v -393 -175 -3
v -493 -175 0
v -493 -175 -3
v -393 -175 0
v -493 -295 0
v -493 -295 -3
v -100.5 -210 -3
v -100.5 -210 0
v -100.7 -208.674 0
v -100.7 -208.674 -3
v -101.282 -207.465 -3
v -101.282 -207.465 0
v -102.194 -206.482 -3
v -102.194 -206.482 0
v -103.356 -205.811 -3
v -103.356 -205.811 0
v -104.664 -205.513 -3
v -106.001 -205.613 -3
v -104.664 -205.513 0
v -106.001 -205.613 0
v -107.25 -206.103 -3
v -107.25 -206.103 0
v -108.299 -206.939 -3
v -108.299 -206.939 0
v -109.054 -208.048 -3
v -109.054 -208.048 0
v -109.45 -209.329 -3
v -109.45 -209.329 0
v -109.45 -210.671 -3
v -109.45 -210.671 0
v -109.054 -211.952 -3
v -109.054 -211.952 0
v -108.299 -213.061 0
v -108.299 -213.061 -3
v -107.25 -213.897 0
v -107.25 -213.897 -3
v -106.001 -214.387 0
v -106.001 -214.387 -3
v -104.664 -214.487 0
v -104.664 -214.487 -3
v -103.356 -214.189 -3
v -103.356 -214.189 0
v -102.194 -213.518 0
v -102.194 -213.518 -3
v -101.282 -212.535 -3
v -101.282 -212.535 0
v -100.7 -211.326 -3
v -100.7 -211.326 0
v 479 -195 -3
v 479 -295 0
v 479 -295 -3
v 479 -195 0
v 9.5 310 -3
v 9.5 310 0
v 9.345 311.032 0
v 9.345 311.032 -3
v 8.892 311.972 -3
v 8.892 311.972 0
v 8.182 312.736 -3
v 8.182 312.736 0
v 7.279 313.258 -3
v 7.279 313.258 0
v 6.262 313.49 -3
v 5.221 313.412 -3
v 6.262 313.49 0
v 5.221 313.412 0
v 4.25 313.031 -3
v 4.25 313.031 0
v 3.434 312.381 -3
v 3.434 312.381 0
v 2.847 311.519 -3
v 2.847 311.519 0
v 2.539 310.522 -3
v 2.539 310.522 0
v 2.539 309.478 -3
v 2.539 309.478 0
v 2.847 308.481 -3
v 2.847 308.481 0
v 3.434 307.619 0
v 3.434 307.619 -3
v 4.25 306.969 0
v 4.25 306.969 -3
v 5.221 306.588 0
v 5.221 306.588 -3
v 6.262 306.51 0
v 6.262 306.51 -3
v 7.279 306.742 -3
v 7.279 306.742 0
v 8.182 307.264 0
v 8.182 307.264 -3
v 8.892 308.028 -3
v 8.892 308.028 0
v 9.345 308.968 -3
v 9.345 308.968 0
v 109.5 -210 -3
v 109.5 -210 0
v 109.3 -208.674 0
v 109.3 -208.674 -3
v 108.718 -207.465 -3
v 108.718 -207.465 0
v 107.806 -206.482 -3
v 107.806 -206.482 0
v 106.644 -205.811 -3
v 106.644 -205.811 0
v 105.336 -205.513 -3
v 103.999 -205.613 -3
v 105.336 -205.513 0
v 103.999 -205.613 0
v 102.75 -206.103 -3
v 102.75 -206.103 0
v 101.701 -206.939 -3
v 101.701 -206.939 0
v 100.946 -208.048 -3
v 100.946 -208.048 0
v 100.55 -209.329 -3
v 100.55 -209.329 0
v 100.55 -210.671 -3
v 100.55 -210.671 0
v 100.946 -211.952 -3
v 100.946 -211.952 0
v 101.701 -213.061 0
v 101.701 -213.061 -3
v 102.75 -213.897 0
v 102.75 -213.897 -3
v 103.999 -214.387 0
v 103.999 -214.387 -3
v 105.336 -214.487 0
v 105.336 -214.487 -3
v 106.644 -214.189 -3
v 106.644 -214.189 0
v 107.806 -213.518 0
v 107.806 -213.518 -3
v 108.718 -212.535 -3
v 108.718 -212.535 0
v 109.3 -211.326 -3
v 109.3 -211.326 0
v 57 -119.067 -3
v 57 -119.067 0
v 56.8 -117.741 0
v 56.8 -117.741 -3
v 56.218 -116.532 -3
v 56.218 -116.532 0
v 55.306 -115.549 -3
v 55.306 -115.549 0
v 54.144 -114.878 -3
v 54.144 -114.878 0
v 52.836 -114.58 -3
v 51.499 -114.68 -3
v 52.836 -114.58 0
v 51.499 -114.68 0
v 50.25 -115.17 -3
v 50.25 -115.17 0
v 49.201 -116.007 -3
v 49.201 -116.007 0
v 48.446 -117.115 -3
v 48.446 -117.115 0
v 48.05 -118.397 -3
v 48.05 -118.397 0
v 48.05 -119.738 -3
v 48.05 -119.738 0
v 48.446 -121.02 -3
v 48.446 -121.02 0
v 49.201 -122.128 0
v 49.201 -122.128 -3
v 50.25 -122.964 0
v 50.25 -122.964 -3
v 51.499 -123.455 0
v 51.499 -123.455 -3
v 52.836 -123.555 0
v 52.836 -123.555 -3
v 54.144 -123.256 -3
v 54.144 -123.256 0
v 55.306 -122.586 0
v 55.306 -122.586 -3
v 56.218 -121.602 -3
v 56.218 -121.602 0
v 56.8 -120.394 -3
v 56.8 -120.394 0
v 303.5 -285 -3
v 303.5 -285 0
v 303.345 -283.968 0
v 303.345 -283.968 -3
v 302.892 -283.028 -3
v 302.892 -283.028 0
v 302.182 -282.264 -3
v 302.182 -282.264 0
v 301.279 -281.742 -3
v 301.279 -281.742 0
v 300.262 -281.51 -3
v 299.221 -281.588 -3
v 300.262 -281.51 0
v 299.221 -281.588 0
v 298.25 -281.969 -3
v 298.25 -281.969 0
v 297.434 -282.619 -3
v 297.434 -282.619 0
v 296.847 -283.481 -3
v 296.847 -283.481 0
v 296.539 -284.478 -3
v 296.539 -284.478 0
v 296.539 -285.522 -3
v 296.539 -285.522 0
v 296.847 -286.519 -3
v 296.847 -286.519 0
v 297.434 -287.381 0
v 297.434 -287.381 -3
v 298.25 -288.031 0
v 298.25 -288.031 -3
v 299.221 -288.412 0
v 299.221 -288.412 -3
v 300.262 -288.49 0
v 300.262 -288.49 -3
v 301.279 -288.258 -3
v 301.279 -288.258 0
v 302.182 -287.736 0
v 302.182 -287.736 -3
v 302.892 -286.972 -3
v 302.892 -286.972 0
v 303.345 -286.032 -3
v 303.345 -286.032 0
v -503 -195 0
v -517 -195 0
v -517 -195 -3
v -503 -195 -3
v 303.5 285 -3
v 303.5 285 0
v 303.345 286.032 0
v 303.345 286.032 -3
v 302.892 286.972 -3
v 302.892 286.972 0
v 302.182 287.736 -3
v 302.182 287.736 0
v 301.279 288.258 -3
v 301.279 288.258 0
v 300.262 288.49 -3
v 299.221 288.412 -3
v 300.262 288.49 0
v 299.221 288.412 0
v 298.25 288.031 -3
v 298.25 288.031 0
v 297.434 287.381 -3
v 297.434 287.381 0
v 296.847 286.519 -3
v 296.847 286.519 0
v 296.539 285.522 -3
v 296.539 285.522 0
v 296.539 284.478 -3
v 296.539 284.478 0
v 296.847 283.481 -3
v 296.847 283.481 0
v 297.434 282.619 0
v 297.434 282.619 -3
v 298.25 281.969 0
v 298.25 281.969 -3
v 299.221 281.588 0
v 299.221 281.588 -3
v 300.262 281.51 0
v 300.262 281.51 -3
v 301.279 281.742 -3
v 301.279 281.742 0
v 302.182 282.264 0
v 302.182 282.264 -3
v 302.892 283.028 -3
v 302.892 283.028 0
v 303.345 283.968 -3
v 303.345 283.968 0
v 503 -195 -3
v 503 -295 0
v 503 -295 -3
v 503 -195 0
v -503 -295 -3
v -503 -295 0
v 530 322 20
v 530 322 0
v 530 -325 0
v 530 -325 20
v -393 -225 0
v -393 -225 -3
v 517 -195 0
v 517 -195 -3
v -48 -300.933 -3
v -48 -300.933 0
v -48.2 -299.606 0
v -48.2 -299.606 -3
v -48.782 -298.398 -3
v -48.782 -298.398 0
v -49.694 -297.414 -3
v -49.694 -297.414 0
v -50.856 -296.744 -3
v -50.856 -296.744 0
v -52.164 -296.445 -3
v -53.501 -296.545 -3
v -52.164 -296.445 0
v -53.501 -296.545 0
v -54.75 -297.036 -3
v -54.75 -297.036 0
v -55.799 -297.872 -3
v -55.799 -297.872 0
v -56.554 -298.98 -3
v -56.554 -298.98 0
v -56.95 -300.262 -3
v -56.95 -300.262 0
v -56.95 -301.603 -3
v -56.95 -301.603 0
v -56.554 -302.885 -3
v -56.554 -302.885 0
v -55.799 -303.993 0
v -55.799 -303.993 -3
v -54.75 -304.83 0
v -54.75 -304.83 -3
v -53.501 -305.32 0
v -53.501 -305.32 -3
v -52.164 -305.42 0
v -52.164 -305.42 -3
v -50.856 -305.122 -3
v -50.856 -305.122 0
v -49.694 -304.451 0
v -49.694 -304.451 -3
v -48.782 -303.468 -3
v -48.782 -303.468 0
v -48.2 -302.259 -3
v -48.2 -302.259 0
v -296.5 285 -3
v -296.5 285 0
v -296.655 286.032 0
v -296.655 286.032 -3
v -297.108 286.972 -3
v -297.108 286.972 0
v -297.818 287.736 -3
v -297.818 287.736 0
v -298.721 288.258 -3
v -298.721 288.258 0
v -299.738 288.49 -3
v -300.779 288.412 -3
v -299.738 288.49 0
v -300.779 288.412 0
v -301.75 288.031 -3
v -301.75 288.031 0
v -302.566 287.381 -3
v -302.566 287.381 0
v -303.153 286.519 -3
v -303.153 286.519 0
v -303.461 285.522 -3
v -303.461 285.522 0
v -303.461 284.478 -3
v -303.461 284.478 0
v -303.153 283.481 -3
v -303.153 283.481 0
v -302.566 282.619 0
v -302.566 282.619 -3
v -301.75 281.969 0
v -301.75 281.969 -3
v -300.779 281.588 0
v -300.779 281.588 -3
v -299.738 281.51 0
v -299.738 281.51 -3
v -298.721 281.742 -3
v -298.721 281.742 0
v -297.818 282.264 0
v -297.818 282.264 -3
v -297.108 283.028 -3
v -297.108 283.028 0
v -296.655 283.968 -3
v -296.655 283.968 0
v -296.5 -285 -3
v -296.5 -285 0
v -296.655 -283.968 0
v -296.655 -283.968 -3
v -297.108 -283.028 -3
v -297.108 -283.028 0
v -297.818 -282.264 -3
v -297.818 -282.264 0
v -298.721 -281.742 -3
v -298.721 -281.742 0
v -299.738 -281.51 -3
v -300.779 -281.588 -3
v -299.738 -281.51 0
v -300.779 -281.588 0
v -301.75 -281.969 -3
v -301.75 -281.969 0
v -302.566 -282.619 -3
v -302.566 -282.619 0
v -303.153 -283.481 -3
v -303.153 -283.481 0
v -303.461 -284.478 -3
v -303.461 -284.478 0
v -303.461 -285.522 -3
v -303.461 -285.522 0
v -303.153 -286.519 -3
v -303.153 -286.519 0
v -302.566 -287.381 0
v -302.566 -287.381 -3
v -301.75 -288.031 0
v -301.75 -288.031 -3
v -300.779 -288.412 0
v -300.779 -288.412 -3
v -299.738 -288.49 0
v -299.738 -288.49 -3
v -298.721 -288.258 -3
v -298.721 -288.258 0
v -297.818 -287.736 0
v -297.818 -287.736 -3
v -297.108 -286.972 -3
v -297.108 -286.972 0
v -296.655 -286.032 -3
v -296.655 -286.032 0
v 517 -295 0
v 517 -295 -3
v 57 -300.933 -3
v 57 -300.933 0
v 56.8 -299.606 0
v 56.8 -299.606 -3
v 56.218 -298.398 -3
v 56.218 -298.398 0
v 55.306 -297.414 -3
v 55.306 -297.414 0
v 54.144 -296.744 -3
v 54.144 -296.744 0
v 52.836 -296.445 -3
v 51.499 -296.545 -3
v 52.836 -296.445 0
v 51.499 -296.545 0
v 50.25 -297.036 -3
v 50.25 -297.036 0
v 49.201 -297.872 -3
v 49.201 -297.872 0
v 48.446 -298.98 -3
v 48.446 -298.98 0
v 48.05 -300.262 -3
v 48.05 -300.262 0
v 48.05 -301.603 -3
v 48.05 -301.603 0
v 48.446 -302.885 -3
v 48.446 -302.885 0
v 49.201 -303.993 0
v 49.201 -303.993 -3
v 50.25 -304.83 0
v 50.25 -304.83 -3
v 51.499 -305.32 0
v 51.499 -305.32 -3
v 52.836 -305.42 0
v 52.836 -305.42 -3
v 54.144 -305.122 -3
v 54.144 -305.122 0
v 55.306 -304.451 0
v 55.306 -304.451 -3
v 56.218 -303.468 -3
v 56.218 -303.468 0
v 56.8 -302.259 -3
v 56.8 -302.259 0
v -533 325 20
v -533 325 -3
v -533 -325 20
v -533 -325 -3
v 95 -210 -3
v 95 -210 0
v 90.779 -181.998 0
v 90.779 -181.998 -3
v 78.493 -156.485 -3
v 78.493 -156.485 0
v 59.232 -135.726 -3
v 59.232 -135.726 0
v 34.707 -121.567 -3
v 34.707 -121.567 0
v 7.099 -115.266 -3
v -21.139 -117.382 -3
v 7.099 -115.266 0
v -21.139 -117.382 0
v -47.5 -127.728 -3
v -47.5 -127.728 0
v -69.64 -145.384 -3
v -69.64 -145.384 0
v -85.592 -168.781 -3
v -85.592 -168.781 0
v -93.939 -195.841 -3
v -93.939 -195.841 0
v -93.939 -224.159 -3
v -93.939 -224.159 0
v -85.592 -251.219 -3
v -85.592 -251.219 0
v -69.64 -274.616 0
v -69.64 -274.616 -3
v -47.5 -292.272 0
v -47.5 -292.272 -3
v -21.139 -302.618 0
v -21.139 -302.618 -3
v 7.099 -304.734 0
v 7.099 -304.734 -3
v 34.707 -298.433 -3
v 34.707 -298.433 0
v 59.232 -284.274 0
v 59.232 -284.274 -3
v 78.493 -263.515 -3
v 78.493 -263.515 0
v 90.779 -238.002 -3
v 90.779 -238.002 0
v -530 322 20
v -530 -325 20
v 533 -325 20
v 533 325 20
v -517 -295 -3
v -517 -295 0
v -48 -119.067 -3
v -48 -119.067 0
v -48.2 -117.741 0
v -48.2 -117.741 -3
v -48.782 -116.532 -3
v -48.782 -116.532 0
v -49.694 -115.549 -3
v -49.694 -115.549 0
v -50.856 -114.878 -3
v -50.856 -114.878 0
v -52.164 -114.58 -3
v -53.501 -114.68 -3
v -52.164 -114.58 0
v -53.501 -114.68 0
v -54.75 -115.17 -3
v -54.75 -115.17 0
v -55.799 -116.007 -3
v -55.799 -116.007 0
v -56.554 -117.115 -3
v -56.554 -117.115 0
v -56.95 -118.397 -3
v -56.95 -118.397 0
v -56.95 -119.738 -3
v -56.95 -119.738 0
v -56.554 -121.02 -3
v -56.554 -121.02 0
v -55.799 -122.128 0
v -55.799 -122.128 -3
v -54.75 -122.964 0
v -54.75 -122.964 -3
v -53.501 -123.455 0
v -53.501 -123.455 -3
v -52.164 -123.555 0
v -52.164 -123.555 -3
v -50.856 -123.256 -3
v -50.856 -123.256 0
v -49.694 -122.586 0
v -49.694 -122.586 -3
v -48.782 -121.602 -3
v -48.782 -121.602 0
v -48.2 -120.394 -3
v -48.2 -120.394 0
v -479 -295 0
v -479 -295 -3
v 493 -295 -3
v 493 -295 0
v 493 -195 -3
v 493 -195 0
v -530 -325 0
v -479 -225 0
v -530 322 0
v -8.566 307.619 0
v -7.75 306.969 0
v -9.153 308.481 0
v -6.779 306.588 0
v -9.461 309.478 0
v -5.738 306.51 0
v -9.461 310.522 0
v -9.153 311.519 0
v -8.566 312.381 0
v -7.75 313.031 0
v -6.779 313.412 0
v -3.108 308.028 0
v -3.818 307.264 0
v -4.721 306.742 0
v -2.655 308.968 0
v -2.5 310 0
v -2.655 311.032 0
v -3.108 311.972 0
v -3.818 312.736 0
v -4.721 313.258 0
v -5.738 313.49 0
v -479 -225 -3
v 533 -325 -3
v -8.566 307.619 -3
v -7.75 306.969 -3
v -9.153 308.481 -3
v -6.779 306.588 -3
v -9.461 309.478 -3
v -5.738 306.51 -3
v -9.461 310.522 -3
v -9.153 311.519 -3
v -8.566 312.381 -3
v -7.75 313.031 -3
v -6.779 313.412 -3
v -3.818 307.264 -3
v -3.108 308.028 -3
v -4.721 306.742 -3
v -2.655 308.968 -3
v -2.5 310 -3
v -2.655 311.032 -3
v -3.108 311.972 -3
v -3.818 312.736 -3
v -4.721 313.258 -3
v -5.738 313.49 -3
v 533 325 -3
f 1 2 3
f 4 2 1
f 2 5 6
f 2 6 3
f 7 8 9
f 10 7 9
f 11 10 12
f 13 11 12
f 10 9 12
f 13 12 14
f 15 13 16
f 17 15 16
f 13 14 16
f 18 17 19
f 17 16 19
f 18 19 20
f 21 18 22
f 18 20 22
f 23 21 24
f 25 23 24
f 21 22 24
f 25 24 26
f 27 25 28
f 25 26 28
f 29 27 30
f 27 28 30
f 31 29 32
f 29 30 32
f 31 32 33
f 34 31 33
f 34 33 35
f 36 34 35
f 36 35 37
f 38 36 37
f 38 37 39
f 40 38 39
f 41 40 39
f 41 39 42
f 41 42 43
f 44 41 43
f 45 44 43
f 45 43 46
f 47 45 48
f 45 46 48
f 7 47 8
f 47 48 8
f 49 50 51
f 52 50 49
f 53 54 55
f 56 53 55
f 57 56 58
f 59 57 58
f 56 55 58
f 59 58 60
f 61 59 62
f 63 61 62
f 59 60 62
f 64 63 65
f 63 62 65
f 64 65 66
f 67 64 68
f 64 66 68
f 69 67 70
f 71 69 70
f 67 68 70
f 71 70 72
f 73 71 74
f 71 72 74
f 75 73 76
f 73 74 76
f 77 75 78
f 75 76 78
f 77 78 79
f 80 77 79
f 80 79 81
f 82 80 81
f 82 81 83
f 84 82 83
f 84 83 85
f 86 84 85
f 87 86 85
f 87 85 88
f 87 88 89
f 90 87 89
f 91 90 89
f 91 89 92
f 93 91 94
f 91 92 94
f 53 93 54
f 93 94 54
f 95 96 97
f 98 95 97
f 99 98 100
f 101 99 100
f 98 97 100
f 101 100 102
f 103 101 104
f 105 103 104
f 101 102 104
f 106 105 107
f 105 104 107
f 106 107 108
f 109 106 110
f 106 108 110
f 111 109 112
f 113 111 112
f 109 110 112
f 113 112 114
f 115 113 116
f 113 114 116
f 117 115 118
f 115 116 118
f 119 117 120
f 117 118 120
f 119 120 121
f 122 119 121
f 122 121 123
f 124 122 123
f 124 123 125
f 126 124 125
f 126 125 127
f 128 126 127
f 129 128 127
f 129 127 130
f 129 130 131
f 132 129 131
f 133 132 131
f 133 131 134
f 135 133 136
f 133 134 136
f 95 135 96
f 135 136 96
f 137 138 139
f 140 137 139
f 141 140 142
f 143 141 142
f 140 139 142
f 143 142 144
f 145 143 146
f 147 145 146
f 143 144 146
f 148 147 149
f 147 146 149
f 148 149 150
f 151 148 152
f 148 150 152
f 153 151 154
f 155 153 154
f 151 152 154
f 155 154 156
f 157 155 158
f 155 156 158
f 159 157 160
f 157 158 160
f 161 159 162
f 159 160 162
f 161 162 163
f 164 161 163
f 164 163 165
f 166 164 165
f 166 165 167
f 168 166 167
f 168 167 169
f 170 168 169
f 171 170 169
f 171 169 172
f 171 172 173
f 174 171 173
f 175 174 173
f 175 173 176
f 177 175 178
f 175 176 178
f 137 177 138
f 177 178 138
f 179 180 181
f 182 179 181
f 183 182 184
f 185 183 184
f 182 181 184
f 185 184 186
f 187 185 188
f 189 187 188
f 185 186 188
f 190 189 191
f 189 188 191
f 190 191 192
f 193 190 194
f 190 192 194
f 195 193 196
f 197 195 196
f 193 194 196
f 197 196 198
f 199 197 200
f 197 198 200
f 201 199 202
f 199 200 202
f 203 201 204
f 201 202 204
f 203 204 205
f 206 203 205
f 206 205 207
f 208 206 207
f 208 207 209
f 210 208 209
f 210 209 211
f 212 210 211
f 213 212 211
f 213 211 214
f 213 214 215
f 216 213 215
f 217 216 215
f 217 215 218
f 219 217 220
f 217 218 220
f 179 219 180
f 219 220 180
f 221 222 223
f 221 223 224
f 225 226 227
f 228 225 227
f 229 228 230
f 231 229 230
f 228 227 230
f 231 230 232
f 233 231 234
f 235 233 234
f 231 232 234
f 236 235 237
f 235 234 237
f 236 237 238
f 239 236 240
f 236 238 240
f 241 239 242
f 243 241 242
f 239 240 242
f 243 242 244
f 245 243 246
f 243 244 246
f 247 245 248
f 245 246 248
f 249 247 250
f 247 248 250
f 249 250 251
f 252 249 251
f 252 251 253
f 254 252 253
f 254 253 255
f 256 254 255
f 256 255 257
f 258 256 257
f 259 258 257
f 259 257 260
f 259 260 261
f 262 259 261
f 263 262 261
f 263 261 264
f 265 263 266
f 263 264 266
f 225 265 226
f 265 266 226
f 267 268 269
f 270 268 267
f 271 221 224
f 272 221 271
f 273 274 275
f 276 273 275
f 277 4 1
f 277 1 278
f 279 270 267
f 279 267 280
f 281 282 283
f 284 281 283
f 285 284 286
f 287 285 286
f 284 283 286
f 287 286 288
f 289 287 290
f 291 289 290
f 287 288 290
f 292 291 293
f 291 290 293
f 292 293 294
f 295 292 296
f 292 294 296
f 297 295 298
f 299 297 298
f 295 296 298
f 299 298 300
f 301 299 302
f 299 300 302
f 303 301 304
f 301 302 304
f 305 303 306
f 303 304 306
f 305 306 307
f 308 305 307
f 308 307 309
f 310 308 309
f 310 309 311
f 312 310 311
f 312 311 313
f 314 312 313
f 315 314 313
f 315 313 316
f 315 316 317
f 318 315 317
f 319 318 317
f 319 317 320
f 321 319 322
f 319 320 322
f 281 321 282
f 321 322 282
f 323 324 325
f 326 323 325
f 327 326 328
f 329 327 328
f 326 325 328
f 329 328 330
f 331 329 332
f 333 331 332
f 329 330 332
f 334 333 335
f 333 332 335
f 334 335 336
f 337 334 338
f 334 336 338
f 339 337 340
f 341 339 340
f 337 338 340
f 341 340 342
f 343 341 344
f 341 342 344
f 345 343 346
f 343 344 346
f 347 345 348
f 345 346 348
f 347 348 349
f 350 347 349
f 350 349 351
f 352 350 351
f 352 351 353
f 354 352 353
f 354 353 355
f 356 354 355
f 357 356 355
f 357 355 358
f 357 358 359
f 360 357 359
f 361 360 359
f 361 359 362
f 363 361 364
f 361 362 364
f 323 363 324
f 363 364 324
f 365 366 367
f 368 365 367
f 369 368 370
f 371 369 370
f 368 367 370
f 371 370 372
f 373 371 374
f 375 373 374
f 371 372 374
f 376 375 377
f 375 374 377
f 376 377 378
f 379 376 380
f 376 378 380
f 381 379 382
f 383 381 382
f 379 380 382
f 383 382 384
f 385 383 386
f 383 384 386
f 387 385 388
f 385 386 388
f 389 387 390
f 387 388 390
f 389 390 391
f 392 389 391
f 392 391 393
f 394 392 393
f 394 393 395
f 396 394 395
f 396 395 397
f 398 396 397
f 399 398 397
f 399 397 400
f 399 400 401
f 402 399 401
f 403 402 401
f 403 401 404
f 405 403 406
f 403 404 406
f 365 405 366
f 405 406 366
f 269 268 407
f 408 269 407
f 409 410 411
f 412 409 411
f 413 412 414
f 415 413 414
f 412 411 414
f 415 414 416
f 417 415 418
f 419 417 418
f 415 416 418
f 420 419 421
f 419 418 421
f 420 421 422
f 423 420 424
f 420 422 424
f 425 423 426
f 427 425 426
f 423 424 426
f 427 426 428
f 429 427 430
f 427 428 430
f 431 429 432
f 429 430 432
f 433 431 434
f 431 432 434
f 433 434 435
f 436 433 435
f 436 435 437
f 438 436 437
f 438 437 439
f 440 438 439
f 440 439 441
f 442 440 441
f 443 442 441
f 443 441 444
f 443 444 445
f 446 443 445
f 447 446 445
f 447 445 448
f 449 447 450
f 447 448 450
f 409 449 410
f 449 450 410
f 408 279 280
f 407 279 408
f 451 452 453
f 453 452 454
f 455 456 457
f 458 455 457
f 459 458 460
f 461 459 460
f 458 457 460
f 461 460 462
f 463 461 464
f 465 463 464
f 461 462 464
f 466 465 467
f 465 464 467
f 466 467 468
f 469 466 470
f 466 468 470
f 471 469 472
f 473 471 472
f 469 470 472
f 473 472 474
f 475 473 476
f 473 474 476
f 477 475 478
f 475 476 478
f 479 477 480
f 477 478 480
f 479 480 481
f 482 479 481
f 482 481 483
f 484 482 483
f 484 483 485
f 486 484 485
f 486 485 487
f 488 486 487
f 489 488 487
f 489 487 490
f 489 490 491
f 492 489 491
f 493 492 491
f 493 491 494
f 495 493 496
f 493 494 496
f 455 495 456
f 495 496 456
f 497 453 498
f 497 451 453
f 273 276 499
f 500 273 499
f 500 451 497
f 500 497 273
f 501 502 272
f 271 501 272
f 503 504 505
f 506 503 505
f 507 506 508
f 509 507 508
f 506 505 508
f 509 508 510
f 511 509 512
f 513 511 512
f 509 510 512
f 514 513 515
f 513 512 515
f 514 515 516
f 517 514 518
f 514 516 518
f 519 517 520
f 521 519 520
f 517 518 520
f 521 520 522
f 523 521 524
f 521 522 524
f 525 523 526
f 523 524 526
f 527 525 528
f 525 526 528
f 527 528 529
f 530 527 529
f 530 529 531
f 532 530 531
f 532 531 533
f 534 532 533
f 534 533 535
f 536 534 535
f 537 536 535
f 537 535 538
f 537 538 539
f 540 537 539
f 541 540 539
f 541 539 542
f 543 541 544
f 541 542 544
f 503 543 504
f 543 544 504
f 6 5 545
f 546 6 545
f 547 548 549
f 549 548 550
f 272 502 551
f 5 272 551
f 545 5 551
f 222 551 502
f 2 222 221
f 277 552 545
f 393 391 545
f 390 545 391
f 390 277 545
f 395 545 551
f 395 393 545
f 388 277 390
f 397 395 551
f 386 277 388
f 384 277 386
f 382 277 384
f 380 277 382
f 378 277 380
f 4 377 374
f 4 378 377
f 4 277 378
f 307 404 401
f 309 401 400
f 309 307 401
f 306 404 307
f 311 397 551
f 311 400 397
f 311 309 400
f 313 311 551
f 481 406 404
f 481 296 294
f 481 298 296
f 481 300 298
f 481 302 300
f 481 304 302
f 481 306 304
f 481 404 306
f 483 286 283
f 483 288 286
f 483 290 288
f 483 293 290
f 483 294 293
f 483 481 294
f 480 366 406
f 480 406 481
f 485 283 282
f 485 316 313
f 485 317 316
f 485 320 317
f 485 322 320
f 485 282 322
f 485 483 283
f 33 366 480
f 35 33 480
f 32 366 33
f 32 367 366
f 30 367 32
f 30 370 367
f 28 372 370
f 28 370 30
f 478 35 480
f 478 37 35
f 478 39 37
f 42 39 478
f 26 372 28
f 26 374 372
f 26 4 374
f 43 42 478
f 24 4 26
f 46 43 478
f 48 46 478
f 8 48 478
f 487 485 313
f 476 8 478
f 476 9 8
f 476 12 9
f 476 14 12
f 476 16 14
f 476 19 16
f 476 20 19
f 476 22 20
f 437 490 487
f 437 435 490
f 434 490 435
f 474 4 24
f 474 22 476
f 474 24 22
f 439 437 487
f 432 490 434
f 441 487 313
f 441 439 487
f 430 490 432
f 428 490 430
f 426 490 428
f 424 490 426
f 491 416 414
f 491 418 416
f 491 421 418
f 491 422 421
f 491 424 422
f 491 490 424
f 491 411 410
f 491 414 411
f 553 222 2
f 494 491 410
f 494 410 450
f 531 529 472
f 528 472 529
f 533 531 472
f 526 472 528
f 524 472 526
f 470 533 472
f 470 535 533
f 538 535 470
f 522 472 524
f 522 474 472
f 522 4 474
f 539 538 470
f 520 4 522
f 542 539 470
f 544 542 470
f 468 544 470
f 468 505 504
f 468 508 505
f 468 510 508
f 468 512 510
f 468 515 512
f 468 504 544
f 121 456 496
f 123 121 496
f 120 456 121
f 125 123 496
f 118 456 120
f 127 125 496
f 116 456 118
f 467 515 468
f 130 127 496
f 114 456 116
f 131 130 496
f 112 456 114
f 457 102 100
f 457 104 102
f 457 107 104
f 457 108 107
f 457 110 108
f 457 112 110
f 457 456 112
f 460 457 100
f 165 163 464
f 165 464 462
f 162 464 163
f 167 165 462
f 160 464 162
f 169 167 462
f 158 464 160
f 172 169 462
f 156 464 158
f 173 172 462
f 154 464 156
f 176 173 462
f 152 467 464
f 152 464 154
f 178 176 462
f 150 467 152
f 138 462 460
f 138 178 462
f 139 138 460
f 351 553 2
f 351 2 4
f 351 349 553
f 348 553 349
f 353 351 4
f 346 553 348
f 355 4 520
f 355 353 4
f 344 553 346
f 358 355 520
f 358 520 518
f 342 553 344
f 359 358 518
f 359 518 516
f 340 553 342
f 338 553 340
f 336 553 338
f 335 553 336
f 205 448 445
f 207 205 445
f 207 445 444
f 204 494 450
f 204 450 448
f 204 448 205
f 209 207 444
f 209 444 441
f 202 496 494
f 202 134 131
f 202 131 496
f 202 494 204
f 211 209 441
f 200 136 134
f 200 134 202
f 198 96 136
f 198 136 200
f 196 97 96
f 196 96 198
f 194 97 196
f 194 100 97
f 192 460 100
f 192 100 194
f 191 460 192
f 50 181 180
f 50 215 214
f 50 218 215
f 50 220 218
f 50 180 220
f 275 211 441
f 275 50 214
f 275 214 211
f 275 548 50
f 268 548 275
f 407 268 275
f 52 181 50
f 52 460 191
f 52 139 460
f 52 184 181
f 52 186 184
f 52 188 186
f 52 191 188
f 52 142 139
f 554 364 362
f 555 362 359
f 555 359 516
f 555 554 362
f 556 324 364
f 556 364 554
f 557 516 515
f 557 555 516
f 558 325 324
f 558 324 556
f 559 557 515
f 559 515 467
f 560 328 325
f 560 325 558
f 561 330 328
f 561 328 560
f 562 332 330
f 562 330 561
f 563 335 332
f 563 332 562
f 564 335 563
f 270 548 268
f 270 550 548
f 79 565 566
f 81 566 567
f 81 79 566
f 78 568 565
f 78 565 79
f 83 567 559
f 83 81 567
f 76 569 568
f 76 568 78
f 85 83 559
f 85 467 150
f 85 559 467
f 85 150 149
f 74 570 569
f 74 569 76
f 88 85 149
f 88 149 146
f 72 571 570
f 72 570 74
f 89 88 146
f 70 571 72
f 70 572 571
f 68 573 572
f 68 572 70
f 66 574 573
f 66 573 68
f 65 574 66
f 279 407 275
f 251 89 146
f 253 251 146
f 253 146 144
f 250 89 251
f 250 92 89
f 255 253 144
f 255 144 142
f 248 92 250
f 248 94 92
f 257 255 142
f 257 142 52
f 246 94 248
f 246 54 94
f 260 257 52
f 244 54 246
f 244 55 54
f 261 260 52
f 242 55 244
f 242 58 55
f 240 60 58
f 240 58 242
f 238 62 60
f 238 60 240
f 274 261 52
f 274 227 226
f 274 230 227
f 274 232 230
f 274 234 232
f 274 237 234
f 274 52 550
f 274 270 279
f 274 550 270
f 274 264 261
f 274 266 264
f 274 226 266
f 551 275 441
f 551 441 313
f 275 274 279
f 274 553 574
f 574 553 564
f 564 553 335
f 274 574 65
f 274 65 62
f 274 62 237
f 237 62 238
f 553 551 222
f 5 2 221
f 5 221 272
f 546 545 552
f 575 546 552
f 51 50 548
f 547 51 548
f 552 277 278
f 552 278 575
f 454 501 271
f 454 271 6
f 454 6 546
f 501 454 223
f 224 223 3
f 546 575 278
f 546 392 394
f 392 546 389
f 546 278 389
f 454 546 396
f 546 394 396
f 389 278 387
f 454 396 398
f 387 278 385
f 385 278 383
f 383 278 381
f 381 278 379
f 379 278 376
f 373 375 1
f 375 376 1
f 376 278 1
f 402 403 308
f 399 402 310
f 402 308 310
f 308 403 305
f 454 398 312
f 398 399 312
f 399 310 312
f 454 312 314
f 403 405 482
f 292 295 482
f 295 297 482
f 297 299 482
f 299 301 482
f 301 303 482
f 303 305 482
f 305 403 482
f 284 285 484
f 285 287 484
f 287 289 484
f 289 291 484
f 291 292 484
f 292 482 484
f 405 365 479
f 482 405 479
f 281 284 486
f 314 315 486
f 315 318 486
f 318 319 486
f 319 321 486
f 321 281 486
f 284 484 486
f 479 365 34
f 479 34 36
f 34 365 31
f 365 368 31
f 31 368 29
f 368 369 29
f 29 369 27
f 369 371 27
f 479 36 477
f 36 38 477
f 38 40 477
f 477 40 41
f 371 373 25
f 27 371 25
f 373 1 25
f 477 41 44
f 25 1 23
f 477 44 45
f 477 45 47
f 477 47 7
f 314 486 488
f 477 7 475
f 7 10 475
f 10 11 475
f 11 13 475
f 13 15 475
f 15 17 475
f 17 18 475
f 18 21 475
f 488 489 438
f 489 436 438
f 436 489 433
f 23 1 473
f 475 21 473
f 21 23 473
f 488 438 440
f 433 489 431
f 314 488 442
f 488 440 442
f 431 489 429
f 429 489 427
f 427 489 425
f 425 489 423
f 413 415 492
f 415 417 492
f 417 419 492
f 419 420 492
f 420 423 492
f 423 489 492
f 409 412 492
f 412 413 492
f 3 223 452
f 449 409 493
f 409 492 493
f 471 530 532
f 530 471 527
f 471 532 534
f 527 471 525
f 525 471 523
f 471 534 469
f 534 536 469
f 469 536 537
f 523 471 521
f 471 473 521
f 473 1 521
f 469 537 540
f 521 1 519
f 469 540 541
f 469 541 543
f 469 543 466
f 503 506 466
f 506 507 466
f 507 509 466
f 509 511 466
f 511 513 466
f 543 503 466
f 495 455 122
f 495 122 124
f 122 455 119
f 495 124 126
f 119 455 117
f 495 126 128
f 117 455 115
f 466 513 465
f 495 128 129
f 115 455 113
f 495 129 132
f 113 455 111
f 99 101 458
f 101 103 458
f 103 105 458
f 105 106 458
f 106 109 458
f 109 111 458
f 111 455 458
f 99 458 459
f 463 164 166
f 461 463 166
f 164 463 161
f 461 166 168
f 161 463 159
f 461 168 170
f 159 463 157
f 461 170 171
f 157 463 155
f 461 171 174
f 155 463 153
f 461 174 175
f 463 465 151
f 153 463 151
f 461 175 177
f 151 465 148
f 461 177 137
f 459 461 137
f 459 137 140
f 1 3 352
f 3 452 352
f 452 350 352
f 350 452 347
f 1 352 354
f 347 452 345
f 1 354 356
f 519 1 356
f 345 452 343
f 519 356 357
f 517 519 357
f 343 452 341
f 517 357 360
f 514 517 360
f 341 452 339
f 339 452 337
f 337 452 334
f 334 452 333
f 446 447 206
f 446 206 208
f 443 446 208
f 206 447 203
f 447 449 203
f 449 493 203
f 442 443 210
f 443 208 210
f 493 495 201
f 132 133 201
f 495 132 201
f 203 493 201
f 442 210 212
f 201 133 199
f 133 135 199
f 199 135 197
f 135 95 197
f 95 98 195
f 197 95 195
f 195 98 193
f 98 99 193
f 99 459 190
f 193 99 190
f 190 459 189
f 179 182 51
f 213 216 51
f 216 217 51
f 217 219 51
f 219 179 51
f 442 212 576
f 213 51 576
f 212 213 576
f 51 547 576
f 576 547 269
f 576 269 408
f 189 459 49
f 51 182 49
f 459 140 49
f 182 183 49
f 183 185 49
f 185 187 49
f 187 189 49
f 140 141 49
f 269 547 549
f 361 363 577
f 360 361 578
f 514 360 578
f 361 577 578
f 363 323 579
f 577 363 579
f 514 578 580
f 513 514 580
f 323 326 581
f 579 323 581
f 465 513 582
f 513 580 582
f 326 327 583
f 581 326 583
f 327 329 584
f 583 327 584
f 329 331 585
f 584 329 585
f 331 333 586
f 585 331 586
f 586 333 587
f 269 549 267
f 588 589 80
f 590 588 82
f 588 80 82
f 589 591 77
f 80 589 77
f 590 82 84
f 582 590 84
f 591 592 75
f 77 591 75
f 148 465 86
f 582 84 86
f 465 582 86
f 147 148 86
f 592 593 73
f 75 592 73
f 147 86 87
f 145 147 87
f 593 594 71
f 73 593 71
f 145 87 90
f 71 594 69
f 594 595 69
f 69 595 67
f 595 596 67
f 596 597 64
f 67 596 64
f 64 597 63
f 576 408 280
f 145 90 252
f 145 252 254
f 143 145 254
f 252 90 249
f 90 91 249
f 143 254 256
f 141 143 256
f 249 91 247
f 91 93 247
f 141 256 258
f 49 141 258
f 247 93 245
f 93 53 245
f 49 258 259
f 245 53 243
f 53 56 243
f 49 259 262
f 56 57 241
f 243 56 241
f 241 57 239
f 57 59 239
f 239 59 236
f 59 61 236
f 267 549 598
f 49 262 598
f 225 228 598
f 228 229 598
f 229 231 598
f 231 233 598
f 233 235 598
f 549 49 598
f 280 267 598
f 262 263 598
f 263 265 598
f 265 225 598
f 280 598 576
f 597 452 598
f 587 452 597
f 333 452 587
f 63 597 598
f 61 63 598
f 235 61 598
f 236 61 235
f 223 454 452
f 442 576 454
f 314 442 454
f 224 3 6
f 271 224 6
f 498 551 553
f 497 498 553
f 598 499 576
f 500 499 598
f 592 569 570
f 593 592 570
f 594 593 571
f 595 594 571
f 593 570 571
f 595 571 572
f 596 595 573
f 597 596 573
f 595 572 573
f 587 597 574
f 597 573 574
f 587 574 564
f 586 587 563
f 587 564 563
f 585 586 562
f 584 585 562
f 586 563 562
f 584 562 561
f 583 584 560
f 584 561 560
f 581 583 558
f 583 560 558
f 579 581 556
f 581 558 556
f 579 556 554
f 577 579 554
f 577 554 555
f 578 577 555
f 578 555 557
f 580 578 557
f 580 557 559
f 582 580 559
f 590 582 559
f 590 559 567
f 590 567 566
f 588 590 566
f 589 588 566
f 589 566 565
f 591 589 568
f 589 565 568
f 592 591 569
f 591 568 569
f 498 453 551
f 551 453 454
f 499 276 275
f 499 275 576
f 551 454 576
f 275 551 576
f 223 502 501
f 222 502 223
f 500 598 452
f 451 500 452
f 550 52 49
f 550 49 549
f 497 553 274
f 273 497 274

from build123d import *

# Parameters (mm, degrees)
F0_R     = 3.5
F0_R_2   = 4.5
F0_R_3   = 95
F0_W     = 14
F0_H     = 30
F1_DEPTH = 3
F3_DEPTH = 20
F4_W     = 14
F4_H     = 70
F4_H_2   = 100
F5_DEPTH = 3.001


with BuildPart() as f1:
    # F0 (on Top) → F1 (new body)
    with BuildSketch(Plane.XY):
        Polygon((533, -325), (533, 325), (-533, 325), (-533, -325), (-517, -325), (-517, -295), (-517, -195), (-503, -195), (-503, -295), (-503, -325), (503, -325), (503, -295), (503, -195), (517, -195), (517, -295), (517, -325), align=None)
        with Locations((-300, -285)):
            Circle(F0_R, mode=Mode.SUBTRACT)
        Polygon((-493, -175), (-468, -175), (-418, -175), (-393, -175), (-393, -225), (-418, -225), (-468, -225), (-493, -225), align=None, mode=Mode.SUBTRACT)
        with Locations((-52.5, -300.932667)):
            Circle(F0_R_2, mode=Mode.SUBTRACT)
        with Locations((-105, -210)):
            Circle(F0_R_2, mode=Mode.SUBTRACT)
        with Locations((-52.5, -119.067333)):
            Circle(F0_R_2, mode=Mode.SUBTRACT)
        with Locations((52.5, -300.932667)):
            Circle(F0_R_2, mode=Mode.SUBTRACT)
        with Locations((0, -210)):
            Circle(F0_R_3, mode=Mode.SUBTRACT)
        with Locations((105, -210)):
            Circle(F0_R_2, mode=Mode.SUBTRACT)
        with Locations((300, -285)):
            Circle(F0_R, mode=Mode.SUBTRACT)
        with Locations((52.5, -119.067333)):
            Circle(F0_R_2, mode=Mode.SUBTRACT)
        with Locations((-300, 285)):
            Circle(F0_R, mode=Mode.SUBTRACT)
        with Locations((-6, 310)):
            Circle(F0_R, mode=Mode.SUBTRACT)
        with Locations((6, 310)):
            Circle(F0_R, mode=Mode.SUBTRACT)
        with Locations((300, 285)):
            Circle(F0_R, mode=Mode.SUBTRACT)
        with Locations((-510, -310)):
            Rectangle(F0_W, F0_H)
        with Locations((510, -310)):
            Rectangle(F0_W, F0_H)
    extrude(amount=-F1_DEPTH)

    # F2 (on face) → F3 (join)
    with BuildSketch(Plane.XY):
        Polygon((-533, -325), (-530, -325), (-530, 322), (530, 322), (530, -325), (533, -325), (533, 325), (-533, 325), align=None)
    extrude(amount=F3_DEPTH)

    # F4 (on face) → F5 (cut, through all)
    with BuildSketch(Plane.XY):
        with Locations((-486, -260)):
            Rectangle(F4_W, F4_H)
        with Locations((486, -245)):
            Rectangle(F4_W, F4_H_2)
    extrude(amount=-F5_DEPTH, mode=Mode.SUBTRACT)


solid = f1.part
